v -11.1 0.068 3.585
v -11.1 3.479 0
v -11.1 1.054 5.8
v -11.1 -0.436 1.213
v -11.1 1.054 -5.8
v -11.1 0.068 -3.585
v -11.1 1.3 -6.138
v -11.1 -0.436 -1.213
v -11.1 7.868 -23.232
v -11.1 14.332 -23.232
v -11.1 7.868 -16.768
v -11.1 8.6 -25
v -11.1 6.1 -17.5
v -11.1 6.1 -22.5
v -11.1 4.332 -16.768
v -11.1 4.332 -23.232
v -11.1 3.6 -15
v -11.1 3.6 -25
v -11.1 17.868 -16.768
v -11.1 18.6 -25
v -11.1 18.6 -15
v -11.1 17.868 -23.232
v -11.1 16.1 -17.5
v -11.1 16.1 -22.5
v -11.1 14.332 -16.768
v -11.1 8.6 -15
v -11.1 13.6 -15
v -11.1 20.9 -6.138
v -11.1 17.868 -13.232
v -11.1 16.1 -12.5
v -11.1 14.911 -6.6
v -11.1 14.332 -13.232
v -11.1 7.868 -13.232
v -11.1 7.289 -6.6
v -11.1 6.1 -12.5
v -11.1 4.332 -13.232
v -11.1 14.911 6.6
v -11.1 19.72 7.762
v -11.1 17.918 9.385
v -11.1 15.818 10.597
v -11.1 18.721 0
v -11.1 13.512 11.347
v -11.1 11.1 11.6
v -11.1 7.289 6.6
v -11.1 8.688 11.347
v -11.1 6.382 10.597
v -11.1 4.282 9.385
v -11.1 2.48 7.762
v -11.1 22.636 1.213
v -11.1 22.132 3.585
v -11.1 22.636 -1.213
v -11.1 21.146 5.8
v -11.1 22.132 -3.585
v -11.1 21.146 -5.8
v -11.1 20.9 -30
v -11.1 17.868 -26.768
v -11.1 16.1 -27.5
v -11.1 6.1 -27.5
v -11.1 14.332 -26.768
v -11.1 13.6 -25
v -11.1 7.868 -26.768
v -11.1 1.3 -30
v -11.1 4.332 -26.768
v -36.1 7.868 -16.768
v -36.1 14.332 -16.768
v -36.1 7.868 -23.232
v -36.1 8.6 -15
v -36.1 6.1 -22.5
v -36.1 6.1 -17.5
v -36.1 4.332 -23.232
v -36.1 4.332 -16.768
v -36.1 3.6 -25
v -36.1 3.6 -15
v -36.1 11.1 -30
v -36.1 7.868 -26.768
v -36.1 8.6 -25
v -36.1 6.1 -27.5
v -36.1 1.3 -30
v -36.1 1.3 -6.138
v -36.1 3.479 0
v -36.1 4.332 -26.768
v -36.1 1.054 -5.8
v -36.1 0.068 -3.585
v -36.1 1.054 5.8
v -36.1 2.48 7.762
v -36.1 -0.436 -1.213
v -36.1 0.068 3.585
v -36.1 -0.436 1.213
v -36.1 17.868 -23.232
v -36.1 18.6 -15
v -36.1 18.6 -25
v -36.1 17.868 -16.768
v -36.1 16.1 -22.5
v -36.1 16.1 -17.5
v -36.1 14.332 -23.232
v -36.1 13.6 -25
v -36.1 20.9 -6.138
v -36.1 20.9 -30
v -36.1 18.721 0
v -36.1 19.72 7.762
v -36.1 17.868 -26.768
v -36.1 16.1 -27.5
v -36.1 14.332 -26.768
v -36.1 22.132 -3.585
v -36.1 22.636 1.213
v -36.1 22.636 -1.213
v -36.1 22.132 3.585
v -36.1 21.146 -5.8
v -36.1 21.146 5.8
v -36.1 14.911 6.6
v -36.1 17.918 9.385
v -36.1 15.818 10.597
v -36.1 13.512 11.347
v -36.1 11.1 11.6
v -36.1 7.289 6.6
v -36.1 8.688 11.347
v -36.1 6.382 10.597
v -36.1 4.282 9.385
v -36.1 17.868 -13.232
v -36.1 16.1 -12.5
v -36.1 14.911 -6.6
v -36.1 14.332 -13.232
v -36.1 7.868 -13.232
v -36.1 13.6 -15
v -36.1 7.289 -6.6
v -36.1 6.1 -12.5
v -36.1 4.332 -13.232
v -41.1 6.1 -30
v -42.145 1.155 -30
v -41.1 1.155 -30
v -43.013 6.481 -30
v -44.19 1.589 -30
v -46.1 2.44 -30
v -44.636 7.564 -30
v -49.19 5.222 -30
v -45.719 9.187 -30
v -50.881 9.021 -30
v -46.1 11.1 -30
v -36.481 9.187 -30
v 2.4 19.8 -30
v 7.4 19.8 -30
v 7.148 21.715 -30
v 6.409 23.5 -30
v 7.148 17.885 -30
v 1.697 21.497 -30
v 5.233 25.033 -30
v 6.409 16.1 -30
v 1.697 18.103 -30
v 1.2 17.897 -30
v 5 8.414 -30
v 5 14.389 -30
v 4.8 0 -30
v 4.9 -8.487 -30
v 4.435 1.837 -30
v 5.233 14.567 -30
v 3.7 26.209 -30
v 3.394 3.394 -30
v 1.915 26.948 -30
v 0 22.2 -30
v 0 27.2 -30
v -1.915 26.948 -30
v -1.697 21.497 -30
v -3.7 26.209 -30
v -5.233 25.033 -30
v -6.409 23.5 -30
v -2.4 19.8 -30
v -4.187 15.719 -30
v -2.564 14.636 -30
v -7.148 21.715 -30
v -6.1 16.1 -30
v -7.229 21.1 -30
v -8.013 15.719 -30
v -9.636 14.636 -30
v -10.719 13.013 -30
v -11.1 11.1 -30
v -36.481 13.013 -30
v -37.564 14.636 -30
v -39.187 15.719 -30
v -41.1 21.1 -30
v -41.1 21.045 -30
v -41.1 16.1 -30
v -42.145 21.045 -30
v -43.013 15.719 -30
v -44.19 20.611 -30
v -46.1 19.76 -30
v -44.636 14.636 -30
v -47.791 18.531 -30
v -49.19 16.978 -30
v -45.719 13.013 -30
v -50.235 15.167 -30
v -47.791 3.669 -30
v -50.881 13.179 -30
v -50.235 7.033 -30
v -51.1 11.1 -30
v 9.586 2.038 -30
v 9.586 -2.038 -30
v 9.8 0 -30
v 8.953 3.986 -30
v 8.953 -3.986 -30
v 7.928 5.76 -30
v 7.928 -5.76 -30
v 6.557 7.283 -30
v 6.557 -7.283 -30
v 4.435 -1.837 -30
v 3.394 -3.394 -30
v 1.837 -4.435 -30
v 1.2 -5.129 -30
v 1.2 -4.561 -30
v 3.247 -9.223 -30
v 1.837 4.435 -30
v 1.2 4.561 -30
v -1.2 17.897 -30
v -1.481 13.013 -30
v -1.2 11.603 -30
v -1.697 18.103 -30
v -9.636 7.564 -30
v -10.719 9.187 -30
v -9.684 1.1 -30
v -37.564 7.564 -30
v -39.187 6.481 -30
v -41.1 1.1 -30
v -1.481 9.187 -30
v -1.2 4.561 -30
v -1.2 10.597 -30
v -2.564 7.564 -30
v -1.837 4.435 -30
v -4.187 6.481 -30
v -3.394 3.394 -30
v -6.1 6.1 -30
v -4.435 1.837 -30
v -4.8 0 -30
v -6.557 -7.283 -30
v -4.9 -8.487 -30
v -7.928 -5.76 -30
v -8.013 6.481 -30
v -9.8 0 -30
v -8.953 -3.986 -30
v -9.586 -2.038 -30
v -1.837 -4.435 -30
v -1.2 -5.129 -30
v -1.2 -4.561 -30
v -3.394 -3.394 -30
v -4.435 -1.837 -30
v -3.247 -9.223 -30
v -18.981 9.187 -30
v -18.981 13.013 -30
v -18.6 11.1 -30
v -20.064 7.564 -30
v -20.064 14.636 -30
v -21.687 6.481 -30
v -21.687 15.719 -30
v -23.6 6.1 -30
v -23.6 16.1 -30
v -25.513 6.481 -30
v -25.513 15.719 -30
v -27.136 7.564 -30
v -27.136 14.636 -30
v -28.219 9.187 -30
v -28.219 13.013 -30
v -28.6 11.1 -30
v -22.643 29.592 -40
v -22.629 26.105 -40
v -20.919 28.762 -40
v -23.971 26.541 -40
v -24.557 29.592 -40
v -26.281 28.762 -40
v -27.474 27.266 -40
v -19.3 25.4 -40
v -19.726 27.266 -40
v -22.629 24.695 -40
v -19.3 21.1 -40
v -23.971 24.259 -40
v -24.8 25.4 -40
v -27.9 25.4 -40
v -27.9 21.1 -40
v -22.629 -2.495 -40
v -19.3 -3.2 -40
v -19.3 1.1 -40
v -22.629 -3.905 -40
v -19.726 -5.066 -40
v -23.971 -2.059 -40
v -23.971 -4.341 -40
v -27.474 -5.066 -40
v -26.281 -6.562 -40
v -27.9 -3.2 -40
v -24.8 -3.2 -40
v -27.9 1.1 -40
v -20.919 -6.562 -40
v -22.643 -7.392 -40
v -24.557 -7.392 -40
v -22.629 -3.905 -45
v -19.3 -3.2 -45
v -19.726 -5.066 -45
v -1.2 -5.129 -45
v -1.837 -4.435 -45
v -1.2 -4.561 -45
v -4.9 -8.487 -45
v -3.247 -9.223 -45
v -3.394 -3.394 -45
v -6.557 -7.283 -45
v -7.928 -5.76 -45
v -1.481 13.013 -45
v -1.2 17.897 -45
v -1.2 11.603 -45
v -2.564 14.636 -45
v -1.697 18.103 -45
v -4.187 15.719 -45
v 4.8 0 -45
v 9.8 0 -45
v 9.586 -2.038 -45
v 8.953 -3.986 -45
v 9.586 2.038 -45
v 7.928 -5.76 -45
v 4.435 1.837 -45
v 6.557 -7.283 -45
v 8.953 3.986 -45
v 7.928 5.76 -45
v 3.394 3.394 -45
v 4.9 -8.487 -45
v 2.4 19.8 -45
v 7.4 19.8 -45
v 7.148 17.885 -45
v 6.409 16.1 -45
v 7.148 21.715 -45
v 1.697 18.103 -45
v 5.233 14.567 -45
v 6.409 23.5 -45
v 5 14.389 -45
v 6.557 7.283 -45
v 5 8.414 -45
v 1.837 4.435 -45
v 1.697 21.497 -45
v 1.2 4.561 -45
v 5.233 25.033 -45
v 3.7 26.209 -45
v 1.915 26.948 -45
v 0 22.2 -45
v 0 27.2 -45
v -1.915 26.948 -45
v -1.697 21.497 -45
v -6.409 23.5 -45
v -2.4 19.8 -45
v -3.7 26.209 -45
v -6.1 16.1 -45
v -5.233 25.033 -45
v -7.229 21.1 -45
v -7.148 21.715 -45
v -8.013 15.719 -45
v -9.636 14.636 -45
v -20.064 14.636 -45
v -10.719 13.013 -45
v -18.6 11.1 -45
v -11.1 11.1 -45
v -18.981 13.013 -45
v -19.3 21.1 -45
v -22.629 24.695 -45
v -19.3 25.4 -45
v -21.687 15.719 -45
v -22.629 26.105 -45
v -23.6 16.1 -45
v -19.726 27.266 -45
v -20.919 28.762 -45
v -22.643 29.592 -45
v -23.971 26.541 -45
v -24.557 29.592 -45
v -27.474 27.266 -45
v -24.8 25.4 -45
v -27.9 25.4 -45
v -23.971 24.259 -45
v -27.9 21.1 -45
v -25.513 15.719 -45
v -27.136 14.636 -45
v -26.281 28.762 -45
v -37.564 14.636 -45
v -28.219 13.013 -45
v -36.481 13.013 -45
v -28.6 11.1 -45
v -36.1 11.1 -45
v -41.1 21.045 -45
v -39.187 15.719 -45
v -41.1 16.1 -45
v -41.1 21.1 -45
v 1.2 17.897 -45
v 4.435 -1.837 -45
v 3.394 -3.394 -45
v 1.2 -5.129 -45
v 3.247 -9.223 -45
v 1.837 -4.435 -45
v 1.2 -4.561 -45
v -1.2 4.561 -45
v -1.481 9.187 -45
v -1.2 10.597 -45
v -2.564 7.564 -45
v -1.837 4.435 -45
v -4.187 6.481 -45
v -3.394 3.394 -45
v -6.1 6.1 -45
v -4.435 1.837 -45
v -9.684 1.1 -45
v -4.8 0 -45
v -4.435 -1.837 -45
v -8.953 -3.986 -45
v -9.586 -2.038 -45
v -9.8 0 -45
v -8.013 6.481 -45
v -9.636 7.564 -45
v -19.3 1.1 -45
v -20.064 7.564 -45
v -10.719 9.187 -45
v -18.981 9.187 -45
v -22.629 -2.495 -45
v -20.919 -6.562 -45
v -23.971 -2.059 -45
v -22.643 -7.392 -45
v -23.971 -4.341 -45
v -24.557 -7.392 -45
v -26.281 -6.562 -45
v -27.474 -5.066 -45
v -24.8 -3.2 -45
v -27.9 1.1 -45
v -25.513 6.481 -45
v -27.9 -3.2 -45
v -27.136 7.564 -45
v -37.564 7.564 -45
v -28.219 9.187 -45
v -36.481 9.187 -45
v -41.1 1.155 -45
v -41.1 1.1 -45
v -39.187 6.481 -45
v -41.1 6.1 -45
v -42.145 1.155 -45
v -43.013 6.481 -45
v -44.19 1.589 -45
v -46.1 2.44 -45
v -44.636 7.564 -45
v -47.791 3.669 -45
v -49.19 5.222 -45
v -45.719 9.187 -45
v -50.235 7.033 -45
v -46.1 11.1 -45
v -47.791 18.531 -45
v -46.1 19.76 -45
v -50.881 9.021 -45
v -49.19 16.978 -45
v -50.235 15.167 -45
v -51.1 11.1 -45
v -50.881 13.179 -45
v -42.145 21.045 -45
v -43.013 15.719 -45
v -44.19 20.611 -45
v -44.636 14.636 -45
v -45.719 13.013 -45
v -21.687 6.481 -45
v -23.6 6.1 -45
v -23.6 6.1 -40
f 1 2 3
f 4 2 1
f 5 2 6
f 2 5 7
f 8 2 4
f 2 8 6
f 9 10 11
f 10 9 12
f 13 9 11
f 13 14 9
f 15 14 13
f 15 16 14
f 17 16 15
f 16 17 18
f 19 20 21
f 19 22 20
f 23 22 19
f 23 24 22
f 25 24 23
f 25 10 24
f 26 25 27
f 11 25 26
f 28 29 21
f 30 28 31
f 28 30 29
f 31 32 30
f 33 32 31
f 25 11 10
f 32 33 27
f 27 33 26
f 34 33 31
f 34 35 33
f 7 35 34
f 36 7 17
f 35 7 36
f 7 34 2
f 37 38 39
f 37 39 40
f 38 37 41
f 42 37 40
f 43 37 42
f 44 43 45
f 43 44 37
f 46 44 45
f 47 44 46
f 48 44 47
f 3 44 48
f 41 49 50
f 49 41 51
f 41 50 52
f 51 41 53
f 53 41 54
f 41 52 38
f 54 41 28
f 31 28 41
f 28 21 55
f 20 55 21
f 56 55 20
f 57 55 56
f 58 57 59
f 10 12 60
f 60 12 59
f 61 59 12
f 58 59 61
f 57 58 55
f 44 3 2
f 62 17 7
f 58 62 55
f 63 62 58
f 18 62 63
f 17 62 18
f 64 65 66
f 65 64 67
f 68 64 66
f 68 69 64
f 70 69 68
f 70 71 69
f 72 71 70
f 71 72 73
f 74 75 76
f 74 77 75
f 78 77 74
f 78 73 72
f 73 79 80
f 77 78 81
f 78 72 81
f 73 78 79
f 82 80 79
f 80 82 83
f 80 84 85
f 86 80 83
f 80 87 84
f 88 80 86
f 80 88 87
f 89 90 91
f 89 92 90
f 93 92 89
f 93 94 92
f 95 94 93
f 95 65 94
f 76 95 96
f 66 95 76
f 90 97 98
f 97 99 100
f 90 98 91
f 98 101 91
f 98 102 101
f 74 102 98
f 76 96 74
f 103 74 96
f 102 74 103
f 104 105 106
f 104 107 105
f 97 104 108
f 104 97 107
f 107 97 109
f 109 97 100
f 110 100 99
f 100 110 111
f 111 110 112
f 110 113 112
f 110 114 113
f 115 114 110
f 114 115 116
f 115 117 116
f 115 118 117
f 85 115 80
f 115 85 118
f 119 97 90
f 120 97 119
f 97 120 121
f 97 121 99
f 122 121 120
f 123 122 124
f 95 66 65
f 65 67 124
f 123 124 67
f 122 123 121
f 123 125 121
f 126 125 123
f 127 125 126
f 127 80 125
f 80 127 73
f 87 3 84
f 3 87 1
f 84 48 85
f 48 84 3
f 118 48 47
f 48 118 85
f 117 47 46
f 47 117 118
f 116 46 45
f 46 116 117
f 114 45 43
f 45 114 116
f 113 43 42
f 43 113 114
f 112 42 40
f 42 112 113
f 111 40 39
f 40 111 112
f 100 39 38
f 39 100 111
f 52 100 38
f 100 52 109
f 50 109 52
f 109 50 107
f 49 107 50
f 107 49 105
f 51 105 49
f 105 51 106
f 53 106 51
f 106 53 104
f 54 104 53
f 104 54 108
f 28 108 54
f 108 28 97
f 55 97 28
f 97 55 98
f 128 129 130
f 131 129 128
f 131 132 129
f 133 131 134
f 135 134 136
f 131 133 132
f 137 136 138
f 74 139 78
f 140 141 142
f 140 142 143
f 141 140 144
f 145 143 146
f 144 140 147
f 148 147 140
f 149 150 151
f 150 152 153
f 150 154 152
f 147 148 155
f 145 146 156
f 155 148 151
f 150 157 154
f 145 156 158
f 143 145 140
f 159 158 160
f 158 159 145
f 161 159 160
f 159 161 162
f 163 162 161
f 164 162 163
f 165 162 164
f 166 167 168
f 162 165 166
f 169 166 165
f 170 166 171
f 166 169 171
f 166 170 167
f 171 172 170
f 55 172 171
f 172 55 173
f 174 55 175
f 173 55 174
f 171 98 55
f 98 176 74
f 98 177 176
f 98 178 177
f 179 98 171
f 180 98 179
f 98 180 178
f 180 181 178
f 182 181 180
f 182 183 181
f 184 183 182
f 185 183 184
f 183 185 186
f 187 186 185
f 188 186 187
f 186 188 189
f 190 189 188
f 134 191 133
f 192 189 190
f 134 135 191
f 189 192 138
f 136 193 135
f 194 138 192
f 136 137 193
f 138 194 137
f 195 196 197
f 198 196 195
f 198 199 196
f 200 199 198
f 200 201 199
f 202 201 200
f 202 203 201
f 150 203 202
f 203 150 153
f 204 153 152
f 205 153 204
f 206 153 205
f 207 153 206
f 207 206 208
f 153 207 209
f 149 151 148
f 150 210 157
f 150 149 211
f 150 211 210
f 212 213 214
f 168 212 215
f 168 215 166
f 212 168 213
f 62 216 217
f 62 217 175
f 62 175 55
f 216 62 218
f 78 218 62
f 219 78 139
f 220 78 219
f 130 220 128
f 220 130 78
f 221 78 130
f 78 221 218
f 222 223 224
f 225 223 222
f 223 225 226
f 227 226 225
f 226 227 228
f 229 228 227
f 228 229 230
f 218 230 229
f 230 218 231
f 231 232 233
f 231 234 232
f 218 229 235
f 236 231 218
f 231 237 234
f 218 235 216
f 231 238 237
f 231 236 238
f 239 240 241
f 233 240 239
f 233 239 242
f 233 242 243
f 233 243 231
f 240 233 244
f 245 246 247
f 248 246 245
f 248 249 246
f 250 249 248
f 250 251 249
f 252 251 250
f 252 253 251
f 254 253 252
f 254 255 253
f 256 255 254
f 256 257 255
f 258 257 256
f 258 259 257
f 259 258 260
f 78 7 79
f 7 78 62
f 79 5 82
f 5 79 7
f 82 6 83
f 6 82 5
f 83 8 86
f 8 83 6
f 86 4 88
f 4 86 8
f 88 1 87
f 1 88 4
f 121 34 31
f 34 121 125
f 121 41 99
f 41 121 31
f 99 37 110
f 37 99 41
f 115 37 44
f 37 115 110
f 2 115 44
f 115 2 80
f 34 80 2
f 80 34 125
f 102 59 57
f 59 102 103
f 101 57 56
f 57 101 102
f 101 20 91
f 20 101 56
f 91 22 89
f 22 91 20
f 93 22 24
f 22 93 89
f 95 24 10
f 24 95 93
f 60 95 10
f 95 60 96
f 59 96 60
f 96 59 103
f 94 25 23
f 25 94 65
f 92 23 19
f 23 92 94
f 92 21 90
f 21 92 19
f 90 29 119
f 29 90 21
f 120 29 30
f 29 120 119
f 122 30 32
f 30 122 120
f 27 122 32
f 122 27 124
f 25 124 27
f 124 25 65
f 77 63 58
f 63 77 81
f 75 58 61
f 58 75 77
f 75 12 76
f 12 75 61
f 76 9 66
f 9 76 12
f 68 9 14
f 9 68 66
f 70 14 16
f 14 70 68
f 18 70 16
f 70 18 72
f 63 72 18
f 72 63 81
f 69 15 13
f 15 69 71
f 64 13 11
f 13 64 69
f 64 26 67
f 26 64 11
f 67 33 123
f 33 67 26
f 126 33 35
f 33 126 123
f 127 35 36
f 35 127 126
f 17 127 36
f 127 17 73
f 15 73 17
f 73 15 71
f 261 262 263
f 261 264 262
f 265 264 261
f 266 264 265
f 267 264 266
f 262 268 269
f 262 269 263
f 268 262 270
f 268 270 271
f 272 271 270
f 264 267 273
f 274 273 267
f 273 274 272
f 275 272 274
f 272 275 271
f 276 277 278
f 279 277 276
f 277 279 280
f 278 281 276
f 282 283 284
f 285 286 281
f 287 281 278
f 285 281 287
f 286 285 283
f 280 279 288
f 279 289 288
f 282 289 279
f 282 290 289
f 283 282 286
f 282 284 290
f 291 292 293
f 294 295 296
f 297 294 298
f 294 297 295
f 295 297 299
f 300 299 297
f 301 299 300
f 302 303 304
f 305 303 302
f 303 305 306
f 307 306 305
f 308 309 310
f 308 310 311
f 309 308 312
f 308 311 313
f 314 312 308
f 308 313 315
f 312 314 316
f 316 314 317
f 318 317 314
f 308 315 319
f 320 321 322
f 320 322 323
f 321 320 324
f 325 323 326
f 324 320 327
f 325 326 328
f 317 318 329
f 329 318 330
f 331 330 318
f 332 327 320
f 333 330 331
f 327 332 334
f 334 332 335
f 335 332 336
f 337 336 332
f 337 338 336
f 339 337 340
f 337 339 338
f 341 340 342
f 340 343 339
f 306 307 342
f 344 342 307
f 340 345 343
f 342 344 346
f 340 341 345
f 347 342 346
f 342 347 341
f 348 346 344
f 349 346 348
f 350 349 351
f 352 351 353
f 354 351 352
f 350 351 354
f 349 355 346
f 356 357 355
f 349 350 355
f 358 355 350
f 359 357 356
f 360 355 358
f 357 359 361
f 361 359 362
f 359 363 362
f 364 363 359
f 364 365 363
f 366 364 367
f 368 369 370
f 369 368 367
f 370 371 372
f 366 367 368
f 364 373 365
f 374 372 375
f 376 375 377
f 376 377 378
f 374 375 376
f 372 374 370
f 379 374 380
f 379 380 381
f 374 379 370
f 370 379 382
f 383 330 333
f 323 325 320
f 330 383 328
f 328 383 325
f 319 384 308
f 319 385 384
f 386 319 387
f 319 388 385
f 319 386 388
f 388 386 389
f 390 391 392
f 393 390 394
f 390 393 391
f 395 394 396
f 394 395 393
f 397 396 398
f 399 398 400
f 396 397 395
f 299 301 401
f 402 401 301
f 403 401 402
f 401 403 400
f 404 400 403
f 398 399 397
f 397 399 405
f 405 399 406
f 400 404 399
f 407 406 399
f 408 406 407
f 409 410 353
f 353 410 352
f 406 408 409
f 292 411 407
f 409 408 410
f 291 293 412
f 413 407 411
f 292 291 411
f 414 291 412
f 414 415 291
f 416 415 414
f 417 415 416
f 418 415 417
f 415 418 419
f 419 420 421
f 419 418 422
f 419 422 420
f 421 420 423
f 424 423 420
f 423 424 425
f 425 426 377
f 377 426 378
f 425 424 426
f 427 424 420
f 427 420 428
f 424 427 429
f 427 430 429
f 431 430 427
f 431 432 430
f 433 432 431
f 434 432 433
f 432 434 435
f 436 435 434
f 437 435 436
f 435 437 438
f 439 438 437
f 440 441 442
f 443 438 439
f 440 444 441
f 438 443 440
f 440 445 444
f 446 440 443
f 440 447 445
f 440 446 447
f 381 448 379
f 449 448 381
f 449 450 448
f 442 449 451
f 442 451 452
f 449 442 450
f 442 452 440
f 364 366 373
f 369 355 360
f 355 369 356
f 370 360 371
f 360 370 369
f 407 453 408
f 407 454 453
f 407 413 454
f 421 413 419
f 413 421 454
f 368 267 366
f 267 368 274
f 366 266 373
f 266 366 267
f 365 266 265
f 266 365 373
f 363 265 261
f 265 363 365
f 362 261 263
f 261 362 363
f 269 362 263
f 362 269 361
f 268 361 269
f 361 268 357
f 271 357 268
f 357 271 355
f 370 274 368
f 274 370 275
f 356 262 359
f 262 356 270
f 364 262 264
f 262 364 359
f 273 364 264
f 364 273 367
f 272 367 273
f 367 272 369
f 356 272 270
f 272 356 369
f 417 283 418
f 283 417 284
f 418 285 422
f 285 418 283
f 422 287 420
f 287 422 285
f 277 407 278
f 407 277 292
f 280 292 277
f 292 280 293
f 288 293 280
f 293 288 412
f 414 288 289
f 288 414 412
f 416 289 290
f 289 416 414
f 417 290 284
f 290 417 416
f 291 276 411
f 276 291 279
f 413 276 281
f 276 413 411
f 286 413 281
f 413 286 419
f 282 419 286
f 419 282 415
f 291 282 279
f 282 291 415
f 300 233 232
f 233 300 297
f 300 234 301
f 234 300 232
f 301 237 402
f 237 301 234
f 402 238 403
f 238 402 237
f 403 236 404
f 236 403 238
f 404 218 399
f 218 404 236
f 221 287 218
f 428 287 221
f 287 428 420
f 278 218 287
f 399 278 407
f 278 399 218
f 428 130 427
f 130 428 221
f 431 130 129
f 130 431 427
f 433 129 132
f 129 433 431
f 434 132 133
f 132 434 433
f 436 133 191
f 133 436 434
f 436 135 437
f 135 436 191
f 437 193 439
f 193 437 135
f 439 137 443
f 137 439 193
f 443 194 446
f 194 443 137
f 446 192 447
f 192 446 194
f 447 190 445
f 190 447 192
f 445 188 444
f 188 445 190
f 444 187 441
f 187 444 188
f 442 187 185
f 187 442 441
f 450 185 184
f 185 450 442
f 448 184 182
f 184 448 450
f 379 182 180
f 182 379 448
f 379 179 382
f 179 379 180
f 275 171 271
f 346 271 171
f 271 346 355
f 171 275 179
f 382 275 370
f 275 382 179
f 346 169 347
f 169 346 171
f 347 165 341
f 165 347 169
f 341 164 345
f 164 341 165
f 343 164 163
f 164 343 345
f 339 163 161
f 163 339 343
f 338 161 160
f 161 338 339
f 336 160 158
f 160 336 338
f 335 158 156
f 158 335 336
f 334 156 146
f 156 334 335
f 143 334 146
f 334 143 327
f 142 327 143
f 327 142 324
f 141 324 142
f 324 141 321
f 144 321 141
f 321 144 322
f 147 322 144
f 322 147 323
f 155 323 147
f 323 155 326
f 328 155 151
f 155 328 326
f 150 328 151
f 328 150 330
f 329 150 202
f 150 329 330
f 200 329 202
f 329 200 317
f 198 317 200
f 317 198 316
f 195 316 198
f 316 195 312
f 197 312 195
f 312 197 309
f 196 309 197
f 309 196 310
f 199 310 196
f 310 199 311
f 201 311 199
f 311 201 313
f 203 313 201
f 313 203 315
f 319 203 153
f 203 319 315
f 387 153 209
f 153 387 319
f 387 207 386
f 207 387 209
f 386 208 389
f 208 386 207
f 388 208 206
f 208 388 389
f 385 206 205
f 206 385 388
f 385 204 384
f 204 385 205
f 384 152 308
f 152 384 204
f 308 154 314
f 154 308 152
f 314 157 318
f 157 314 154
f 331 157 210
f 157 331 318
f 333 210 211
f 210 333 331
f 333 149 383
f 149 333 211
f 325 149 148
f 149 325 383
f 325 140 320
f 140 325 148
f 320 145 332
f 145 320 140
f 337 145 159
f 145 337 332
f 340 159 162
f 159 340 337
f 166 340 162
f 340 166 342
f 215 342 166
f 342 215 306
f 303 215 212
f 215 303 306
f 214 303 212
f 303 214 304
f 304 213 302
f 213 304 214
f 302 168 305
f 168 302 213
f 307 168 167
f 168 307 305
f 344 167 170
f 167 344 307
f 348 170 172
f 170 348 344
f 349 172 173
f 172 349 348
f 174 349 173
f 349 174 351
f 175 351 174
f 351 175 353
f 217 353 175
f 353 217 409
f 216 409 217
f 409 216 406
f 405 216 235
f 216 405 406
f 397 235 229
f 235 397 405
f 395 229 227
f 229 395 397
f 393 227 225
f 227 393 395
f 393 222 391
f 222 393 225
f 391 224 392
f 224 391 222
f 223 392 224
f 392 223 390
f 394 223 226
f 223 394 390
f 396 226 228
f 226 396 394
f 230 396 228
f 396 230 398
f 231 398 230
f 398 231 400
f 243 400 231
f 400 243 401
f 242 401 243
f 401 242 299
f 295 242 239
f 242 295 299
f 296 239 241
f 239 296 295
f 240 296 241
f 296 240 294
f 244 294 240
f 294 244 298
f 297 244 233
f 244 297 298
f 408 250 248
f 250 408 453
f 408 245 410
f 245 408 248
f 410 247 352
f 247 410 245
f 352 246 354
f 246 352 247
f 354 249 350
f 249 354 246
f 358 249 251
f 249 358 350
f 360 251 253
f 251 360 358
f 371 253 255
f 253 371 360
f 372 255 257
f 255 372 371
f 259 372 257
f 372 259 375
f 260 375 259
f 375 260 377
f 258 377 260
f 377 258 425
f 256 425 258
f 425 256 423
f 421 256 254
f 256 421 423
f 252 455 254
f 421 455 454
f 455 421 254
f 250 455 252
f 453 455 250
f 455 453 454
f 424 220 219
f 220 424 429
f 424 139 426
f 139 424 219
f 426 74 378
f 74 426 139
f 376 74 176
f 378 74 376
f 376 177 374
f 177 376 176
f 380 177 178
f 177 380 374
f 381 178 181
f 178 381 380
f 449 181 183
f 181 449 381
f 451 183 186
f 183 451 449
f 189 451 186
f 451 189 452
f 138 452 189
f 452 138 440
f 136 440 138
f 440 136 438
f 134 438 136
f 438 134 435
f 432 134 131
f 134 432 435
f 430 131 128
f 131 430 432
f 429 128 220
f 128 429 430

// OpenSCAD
//
//  Copyright (C) 09-04-2013 Jasper den Ouden.
//
//  This is free software: you can redistribute it and/or modify
//  it under the terms of the GNU General Public License as published
//  by the Free Software Foundation, either version 3 of the License, or
//  (at your option) any later version.
//

t=5;

rr = 9.6/2; //Z-rod radius.
rb = 10; //Horizontal rod radius.
nw = 13.2; // Nut width

dx = 11.1; //Horizonal rod distance
d = 11.1;//rr+rb+2*t;//Distance between rods. TODO
dz=30; //Vertical distance.

al=5;
sr=1.2;

pair_enough=false; //Wether to just have two or as many as wanted half-feature holes.

module z_rod_associated()
{
    hx = dx+2.5*t; 
    x = rr+t+al+t;
    difference()
    {   union()
        {   circle(rr+t); //Round smooth rod.
            translate([0,x]) circle(rr/2+t); //Springy circle
            translate([0,x/2]) square([2*t,x],center=true); //And slot leading to it.

            translate([dx-al,d]) circle(al+t); //Feature hold plate.
            translate([dx+al+5*t,d]) circle(al+t);
            translate([hx,d]) square([2*al+5*t,2*(al+t)],center=true);
        }
        translate([0,x]) circle(rr/2); //hole in springy

        translate([dx-al,d]) circle(al);  //Feature holes.
        translate([dx+2.5*t,d]) circle(al);  //Feature holes.
        translate([dx+al+5*t,d]) circle(al);
        circle(rr); //Hole for smooth rod.
        square([rr/2,2*x], center=true); //Slot for clicking on.
        translate([0,-rr-t]) scale([1/2,1]) rotate(45) //Easier opening.
            square(2*[t,t],center=true); 
    }
}

module screws_plate()
{   hl= 2*rb+t+3*sr; //Plate for screws.
    difference()
    {   union()
        {   square([3*sr+t,hl],center=true);
            translate([0,+hl/2]) circle(3*sr/2+t/2);
            translate([0,-hl/2]) circle(3*sr/2+t/2);
        }
        square(2*[al,al],center=true);
        translate([0,+hl/2]) circle(sr);
        translate([0,-hl/2]) circle(sr);
    }
}

//Slide-on and clamp.
module bottom()
{
    tz = dz+3*t;
    w=2*(rr+t);//3*(rb+t)/2;
    translate([dx,d]) rotate([0,90,0]) linear_extrude(height=5*t) difference()
    {   union()
        {   circle(nw/2+t);
            translate([-dz/2,0]) square([dz,w], center=true);
        }
        difference()
        {   circle(nw);
            for( a= [0:60:360] ) rotate(a) translate([nw,0]) square([nw,nw],center=true);
        }
        if( pair_enough )
        {   for( y=[-al,al] ) translate([al-dz,y])  circle(al/2); }
        else
        {   for( z=[al:2*al:dz-nw/2] )
                for( y=[-al,al] ) translate([z-dz,y])  circle(al/2);
        }        
    }
    hx = dx+2.5*t; 
    translate([hx,d,tz-t]) linear_extrude(height=t) screws_plate();

    translate([0,0,dz]) linear_extrude(height=3*t) z_rod_associated();
}

module as_print()
{   rotate([0,180,0]) bottom(); }
as_print();
